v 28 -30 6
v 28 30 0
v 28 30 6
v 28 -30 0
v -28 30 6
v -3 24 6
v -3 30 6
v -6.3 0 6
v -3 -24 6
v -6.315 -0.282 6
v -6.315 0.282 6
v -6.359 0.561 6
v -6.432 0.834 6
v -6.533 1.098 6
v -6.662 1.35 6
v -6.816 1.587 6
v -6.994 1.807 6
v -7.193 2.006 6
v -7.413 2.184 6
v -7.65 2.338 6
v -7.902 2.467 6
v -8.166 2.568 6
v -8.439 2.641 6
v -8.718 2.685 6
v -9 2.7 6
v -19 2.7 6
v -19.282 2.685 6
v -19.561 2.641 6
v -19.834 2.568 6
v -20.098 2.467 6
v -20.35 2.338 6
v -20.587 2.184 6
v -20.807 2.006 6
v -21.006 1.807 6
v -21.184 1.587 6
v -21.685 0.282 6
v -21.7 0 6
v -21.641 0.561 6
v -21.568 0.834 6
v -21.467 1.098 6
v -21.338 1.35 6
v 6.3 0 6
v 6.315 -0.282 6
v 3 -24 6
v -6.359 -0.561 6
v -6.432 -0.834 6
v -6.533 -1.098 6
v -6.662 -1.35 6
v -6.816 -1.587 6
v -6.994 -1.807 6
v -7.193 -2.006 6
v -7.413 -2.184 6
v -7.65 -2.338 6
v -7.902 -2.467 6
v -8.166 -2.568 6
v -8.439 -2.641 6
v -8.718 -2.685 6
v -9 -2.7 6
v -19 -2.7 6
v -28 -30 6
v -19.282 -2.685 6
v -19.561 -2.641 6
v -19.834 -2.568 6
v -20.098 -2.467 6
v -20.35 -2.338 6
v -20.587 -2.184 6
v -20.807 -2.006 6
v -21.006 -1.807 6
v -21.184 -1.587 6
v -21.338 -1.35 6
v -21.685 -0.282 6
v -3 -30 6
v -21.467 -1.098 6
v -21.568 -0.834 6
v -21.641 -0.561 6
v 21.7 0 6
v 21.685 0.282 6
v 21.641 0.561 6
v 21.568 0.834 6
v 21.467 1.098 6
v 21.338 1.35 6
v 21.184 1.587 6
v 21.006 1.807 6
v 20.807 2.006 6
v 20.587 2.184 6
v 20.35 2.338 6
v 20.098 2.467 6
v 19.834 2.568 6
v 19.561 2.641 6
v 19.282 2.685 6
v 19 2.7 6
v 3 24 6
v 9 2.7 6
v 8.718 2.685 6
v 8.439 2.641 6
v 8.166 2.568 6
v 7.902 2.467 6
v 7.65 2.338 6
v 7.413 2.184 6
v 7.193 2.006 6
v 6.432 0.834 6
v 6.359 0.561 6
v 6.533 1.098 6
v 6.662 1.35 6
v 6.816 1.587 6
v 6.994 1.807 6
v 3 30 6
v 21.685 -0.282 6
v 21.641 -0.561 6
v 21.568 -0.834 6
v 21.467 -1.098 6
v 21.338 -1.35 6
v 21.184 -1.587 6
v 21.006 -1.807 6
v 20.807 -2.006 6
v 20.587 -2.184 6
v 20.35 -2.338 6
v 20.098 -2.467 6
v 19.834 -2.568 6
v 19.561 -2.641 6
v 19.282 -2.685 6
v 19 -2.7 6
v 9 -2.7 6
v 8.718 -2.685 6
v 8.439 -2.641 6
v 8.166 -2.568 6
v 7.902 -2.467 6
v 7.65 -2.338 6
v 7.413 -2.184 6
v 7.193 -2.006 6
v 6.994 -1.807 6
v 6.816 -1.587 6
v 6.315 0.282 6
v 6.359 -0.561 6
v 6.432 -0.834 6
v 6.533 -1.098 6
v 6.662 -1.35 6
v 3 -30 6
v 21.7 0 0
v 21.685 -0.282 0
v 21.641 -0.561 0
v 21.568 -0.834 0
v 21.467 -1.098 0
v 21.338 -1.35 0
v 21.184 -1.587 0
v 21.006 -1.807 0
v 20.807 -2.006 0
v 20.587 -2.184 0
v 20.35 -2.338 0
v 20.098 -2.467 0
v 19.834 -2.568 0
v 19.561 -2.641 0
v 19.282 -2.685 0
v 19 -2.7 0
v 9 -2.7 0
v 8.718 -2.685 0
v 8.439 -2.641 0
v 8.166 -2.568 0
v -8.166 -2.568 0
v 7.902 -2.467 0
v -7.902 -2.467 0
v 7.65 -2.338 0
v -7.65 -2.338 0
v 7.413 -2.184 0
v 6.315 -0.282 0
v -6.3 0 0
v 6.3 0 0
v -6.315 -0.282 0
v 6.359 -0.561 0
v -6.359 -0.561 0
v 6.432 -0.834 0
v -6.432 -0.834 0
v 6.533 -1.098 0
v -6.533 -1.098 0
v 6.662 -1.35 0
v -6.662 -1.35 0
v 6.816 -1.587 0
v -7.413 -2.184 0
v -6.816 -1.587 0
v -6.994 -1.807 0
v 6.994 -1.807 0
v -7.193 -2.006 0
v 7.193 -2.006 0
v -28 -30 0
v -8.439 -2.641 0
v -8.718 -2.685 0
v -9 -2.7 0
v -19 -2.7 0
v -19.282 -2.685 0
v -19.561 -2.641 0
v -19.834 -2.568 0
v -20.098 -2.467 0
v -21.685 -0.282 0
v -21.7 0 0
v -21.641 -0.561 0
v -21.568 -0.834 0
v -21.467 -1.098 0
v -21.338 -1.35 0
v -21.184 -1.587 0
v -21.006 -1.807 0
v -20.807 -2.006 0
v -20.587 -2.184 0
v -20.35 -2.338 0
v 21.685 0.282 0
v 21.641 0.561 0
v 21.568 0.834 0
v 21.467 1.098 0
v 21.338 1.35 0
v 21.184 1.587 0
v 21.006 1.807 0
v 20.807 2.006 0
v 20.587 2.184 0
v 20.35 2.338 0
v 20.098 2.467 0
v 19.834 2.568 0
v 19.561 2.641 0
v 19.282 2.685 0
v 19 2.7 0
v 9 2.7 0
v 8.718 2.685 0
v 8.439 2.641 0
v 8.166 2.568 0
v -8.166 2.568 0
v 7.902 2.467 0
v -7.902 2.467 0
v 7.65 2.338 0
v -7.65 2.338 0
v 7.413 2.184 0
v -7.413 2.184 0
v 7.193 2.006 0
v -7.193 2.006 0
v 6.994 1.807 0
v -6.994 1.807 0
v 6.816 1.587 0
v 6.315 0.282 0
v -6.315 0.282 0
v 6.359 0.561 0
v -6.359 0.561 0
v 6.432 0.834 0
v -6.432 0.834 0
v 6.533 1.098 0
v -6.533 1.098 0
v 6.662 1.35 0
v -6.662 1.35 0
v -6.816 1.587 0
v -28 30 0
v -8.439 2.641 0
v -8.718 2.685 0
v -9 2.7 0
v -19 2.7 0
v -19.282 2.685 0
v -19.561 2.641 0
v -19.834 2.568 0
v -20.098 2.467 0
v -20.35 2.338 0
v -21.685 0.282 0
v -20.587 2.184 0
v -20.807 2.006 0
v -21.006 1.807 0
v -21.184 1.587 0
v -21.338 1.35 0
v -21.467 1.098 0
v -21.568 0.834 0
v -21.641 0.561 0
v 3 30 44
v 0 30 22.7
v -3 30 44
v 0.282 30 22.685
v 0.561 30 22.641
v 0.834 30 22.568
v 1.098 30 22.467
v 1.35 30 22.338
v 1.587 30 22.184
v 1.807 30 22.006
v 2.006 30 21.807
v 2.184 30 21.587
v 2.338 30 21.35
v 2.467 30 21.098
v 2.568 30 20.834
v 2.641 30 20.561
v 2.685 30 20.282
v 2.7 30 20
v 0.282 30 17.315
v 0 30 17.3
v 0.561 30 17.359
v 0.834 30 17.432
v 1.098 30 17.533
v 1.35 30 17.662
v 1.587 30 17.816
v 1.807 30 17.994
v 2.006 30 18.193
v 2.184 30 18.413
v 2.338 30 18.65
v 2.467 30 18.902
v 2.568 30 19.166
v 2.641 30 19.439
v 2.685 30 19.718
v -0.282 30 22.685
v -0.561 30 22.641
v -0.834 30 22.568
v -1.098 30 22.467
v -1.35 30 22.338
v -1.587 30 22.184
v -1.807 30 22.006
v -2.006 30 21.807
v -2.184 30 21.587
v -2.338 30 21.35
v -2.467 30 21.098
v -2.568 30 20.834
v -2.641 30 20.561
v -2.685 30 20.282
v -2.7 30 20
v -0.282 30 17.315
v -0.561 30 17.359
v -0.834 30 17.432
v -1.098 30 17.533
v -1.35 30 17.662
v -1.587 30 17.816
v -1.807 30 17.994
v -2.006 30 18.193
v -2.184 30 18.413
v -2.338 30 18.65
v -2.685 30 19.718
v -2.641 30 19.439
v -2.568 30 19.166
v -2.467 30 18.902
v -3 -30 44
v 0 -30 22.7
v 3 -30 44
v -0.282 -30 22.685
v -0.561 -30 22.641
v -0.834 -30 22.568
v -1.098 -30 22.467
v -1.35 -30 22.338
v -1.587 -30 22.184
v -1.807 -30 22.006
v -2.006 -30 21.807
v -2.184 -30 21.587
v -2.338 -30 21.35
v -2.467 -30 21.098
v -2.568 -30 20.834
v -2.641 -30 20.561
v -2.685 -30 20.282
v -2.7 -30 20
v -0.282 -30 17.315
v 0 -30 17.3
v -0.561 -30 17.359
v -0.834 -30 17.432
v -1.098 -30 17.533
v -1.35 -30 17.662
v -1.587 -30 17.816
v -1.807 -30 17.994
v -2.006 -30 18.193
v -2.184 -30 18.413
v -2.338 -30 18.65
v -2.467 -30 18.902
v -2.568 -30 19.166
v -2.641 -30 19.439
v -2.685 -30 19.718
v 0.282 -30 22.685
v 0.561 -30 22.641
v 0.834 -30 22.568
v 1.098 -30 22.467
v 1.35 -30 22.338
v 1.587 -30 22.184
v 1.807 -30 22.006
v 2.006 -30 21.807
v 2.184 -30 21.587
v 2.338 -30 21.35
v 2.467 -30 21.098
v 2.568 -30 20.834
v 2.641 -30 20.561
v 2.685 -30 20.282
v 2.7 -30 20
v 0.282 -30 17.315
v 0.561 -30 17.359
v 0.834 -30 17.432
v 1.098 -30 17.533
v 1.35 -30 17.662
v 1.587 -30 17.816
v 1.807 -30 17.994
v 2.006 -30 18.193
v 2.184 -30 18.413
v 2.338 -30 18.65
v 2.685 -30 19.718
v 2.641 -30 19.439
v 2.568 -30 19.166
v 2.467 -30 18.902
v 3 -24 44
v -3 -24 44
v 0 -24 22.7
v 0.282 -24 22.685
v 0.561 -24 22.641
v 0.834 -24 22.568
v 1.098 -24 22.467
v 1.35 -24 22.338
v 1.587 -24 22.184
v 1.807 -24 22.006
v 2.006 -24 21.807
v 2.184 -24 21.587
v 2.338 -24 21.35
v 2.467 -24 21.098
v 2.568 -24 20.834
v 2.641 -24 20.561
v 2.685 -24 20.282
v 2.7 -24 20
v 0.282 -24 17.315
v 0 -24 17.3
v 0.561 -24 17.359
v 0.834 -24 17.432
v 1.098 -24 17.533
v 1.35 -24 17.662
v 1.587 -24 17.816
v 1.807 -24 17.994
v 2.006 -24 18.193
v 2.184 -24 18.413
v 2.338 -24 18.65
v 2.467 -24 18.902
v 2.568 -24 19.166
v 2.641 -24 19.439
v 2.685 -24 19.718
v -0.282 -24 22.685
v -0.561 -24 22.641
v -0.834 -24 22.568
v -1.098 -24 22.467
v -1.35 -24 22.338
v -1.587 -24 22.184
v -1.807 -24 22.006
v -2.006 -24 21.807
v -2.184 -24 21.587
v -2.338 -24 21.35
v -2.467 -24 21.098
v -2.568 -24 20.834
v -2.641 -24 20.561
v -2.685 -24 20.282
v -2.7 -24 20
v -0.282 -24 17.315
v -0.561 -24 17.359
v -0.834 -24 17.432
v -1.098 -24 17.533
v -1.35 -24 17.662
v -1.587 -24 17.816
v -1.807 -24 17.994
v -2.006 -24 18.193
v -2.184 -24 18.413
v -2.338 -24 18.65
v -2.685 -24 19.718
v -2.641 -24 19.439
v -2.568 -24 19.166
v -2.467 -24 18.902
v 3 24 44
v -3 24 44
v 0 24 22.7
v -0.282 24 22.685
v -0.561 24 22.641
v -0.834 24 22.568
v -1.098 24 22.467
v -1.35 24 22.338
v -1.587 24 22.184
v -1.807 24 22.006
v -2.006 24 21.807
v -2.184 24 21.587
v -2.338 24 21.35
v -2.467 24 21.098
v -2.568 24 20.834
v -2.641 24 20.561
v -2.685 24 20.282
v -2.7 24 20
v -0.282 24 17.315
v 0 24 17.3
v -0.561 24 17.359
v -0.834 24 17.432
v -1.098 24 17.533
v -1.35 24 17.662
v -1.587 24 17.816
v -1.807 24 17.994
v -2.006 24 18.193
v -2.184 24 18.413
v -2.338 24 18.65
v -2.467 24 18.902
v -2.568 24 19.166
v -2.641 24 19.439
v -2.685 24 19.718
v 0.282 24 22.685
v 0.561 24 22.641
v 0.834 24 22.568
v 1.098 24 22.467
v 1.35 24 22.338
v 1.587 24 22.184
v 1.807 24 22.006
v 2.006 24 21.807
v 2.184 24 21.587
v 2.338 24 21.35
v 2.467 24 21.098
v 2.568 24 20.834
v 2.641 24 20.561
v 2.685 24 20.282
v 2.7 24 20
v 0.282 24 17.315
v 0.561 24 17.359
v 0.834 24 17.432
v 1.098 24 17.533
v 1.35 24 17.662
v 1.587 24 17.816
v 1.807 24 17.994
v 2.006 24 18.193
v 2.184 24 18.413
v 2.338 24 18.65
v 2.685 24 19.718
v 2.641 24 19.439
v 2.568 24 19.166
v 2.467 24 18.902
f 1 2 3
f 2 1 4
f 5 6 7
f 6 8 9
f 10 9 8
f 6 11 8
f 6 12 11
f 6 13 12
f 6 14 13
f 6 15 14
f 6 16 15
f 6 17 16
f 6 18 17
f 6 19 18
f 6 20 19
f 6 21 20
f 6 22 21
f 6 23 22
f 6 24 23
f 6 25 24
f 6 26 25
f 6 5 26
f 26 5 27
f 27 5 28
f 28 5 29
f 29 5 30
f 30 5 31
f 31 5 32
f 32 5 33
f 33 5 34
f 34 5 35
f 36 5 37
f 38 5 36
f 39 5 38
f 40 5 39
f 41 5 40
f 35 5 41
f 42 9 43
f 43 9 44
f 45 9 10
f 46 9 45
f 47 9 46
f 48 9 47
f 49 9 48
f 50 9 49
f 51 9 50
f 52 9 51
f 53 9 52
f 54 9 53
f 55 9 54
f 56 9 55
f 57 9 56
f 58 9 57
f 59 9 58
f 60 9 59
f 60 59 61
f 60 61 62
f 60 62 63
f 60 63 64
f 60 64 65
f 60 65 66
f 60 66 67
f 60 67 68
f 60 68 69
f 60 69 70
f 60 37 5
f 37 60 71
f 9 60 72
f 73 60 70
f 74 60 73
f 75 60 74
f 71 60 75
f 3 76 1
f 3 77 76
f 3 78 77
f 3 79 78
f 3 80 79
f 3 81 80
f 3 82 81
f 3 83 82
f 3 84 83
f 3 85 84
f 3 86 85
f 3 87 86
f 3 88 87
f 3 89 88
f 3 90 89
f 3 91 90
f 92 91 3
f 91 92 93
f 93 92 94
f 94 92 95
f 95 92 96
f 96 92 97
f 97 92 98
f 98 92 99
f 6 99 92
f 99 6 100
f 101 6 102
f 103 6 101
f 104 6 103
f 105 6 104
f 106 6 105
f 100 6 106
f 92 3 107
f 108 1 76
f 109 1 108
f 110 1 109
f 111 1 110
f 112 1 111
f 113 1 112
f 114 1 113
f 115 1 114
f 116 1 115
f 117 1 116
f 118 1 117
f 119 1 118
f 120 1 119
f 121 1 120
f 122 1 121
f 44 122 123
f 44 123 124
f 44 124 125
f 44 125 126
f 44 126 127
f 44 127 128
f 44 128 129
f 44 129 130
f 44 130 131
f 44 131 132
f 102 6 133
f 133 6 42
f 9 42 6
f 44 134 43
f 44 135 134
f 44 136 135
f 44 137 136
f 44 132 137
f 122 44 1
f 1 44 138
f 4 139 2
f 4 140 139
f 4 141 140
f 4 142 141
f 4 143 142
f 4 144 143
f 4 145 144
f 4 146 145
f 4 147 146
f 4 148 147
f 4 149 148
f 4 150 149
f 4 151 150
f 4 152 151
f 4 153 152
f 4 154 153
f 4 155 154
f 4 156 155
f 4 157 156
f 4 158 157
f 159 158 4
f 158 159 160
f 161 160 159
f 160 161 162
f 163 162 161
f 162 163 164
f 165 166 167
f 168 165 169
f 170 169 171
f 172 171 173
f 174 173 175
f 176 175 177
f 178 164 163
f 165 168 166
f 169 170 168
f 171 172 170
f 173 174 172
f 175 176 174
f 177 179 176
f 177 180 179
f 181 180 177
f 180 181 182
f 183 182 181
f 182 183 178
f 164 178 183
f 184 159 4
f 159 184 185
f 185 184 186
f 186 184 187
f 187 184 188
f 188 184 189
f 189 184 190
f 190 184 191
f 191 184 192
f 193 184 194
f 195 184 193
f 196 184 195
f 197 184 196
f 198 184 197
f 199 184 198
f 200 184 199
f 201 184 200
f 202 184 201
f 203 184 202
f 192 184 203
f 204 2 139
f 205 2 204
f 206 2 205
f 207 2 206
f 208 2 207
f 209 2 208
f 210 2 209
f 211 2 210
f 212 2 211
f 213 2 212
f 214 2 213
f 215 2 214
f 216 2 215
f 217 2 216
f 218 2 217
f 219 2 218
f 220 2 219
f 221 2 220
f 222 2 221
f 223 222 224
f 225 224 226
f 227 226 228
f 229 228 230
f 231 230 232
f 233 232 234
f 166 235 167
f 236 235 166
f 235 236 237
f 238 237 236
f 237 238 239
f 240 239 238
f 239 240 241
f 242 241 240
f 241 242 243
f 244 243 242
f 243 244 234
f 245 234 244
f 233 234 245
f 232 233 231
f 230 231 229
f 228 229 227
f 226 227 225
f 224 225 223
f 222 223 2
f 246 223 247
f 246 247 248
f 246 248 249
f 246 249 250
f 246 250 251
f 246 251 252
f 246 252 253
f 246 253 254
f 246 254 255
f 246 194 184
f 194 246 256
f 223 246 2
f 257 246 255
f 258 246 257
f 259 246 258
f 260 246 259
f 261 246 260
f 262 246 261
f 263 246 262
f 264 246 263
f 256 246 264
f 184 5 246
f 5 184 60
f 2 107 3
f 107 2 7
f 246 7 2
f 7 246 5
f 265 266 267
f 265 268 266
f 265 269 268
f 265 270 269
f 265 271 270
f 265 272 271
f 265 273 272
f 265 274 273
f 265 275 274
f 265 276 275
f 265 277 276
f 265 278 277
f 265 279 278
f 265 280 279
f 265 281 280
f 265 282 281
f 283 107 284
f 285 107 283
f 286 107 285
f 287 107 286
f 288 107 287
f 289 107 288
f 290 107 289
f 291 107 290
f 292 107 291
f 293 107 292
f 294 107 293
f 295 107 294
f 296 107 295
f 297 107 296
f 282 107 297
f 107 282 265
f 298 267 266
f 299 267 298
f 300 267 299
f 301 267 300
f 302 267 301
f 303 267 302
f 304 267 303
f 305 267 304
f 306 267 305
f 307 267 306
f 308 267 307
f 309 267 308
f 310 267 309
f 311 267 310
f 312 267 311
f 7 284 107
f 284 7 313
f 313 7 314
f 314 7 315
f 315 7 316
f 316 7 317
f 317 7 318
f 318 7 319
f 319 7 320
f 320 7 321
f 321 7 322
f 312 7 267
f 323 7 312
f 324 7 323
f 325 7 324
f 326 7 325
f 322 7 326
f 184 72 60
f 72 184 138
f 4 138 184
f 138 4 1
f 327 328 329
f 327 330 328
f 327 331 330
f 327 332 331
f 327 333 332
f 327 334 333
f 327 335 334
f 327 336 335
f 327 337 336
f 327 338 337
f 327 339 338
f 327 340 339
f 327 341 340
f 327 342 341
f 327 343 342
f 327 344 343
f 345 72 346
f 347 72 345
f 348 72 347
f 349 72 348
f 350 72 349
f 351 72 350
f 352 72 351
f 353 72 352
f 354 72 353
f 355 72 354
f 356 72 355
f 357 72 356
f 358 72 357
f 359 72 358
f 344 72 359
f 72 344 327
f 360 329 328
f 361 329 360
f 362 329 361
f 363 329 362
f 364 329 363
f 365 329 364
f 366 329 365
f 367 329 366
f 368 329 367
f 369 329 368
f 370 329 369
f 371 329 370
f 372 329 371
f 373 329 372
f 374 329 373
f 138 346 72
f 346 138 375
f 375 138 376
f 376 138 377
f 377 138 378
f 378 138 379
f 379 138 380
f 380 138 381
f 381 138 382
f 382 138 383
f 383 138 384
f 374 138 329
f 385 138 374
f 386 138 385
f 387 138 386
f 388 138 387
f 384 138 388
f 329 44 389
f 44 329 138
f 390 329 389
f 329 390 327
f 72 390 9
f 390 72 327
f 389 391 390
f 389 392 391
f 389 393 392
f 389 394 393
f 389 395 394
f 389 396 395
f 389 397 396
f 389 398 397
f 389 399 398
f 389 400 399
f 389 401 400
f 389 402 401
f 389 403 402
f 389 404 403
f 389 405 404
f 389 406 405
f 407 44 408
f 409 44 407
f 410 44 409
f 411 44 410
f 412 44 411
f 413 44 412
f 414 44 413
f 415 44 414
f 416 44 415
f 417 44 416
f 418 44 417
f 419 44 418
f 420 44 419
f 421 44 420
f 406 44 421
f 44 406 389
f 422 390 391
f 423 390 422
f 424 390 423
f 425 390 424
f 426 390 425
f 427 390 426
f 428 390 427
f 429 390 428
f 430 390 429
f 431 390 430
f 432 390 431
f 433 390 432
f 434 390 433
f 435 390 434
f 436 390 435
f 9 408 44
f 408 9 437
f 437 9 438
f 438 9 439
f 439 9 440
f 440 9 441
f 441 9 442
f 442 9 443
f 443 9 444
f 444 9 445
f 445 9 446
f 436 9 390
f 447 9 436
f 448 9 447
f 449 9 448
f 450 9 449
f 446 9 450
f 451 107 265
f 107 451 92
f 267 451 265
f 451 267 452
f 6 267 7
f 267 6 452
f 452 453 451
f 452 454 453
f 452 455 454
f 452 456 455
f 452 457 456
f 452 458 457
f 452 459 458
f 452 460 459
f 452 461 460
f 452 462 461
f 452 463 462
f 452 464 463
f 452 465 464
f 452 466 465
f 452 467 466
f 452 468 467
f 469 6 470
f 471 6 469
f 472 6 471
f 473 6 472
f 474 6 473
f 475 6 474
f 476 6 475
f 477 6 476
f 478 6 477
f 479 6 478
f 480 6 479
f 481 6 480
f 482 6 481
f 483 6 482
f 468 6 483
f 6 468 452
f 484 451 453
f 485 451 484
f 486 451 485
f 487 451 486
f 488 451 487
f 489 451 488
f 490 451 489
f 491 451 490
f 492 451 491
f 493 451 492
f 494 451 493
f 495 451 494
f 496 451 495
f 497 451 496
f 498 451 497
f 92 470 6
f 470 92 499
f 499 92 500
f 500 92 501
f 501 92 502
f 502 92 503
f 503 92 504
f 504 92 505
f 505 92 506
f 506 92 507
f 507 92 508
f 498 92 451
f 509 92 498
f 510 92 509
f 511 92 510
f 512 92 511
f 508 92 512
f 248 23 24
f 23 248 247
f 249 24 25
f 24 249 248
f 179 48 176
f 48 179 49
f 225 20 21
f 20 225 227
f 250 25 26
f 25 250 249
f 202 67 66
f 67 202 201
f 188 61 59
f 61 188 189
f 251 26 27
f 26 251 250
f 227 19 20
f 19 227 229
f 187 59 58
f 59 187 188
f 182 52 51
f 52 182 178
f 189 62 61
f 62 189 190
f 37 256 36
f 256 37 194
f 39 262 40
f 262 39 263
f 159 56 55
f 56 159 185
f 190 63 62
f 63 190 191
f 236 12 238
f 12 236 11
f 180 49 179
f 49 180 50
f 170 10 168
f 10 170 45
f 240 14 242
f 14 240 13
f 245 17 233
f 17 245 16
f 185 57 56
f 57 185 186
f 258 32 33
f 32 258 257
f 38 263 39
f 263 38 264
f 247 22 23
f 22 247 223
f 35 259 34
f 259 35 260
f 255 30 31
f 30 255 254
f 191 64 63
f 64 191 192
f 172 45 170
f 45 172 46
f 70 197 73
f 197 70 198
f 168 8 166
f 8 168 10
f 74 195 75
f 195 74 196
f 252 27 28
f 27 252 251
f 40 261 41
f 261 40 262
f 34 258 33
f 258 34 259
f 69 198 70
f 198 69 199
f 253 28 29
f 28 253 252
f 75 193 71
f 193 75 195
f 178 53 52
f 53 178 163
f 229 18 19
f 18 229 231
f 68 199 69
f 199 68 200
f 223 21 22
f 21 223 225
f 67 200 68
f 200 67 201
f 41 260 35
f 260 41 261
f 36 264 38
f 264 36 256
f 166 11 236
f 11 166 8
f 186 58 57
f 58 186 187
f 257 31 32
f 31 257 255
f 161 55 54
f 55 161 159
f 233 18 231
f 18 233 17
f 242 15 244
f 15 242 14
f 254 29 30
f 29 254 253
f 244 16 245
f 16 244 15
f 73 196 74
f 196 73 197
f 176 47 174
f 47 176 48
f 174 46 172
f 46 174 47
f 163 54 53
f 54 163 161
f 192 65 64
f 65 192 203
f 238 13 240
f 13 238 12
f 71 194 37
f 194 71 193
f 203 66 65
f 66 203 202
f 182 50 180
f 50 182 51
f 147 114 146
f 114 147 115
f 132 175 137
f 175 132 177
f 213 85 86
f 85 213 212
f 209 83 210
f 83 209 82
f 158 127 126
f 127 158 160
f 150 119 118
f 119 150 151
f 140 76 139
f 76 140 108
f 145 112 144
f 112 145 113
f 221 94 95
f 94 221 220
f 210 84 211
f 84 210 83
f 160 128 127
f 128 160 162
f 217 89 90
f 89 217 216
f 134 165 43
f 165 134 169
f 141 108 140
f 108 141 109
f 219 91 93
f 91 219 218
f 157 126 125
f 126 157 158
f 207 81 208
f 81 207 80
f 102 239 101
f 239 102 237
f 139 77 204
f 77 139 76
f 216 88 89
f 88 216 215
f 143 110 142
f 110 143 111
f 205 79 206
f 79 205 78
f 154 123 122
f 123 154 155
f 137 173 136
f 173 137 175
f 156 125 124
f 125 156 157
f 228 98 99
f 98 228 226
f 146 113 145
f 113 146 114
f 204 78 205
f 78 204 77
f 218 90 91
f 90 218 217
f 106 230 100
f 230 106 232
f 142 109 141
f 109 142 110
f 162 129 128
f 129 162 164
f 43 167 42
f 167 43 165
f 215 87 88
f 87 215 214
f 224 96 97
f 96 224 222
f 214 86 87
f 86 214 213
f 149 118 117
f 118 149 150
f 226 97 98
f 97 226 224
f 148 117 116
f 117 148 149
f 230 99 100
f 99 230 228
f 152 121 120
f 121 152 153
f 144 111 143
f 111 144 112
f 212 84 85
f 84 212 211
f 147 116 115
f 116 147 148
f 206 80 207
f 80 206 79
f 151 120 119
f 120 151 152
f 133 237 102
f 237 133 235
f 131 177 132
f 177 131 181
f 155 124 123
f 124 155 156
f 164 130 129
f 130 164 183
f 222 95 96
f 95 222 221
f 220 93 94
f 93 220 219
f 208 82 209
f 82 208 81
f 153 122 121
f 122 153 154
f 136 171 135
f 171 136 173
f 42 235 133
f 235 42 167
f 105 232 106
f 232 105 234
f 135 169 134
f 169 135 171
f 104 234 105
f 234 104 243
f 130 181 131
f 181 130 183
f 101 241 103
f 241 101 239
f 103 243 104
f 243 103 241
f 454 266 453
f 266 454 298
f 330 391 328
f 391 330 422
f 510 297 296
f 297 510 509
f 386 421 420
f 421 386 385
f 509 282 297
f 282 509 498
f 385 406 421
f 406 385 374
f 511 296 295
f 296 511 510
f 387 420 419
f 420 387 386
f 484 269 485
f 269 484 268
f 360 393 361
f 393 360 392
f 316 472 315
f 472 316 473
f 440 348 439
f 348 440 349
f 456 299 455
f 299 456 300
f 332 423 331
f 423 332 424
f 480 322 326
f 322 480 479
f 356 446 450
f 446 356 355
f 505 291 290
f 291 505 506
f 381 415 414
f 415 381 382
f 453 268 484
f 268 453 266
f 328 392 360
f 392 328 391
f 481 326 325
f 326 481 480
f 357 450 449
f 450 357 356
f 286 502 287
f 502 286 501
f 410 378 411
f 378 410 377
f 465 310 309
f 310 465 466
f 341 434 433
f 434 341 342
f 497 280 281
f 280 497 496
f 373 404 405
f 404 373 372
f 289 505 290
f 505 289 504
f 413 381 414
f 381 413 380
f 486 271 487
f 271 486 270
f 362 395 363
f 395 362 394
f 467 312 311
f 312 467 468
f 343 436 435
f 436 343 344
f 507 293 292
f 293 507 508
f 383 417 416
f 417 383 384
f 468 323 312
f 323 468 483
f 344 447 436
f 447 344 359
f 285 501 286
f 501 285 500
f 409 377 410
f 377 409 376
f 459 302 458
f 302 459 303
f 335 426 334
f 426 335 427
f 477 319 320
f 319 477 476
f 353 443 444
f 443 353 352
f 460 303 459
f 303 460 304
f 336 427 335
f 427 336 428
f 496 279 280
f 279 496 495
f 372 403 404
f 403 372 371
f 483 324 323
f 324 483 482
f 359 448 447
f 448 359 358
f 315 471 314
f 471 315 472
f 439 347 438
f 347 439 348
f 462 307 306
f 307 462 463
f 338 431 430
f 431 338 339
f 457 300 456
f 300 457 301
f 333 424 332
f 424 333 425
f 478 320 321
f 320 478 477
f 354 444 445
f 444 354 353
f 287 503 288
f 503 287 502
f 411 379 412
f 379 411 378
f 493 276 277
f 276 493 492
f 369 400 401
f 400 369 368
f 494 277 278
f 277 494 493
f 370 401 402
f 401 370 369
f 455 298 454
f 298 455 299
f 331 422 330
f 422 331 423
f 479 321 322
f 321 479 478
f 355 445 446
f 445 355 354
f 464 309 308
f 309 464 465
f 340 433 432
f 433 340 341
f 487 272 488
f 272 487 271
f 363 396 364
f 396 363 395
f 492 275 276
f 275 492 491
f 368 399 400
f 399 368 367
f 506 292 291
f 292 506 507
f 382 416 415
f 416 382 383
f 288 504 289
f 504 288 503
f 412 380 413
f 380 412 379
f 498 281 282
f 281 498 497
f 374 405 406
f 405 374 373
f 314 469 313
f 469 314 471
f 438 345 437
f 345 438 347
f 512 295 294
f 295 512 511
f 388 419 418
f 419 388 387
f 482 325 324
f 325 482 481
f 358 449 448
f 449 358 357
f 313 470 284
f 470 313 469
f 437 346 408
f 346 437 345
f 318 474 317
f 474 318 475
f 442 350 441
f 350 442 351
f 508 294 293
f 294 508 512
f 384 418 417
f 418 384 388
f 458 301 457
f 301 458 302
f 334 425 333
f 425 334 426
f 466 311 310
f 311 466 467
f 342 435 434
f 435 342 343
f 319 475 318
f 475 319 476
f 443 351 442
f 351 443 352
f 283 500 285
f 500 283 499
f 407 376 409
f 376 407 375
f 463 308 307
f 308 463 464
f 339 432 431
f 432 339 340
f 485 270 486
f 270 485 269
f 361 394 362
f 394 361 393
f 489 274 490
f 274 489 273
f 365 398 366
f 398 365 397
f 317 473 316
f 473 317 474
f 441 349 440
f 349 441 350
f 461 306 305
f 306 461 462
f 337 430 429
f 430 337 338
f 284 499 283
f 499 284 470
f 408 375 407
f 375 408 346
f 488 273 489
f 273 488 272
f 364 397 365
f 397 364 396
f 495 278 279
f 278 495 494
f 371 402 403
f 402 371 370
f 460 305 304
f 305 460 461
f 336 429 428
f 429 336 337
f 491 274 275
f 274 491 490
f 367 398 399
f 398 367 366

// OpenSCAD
// U pivot bracket, 48 mm opening.
$fn = 60;
eps = 0.02;
base_l = 56;
base_w = 60;
base_t = 6;
ear_t = 6;
ear_h = 40;
pivot_d = 5.4;
module mount(x) {
    hull() {
        translate([x - 5, 0, -eps]) cylinder(d = 5.4, h = base_t + 2 * eps);
        translate([x + 5, 0, -eps]) cylinder(d = 5.4, h = base_t + 2 * eps);
    }
}
difference() {
    union() {
        translate([-base_l / 2, -base_w / 2, 0]) cube([base_l, base_w, base_t]);
        translate([-ear_t / 2, -base_w / 2, base_t - 2]) cube([ear_t, ear_t, ear_h]);
        translate([-ear_t / 2, base_w / 2 - ear_t, base_t - 2]) cube([ear_t, ear_t, ear_h]);
    }
    mount(-14); mount(14);
    translate([0, -base_w / 2 - eps, ear_h / 2]) rotate([-90, 0, 0]) cylinder(d = pivot_d, h = base_w + 2 * eps);
}
